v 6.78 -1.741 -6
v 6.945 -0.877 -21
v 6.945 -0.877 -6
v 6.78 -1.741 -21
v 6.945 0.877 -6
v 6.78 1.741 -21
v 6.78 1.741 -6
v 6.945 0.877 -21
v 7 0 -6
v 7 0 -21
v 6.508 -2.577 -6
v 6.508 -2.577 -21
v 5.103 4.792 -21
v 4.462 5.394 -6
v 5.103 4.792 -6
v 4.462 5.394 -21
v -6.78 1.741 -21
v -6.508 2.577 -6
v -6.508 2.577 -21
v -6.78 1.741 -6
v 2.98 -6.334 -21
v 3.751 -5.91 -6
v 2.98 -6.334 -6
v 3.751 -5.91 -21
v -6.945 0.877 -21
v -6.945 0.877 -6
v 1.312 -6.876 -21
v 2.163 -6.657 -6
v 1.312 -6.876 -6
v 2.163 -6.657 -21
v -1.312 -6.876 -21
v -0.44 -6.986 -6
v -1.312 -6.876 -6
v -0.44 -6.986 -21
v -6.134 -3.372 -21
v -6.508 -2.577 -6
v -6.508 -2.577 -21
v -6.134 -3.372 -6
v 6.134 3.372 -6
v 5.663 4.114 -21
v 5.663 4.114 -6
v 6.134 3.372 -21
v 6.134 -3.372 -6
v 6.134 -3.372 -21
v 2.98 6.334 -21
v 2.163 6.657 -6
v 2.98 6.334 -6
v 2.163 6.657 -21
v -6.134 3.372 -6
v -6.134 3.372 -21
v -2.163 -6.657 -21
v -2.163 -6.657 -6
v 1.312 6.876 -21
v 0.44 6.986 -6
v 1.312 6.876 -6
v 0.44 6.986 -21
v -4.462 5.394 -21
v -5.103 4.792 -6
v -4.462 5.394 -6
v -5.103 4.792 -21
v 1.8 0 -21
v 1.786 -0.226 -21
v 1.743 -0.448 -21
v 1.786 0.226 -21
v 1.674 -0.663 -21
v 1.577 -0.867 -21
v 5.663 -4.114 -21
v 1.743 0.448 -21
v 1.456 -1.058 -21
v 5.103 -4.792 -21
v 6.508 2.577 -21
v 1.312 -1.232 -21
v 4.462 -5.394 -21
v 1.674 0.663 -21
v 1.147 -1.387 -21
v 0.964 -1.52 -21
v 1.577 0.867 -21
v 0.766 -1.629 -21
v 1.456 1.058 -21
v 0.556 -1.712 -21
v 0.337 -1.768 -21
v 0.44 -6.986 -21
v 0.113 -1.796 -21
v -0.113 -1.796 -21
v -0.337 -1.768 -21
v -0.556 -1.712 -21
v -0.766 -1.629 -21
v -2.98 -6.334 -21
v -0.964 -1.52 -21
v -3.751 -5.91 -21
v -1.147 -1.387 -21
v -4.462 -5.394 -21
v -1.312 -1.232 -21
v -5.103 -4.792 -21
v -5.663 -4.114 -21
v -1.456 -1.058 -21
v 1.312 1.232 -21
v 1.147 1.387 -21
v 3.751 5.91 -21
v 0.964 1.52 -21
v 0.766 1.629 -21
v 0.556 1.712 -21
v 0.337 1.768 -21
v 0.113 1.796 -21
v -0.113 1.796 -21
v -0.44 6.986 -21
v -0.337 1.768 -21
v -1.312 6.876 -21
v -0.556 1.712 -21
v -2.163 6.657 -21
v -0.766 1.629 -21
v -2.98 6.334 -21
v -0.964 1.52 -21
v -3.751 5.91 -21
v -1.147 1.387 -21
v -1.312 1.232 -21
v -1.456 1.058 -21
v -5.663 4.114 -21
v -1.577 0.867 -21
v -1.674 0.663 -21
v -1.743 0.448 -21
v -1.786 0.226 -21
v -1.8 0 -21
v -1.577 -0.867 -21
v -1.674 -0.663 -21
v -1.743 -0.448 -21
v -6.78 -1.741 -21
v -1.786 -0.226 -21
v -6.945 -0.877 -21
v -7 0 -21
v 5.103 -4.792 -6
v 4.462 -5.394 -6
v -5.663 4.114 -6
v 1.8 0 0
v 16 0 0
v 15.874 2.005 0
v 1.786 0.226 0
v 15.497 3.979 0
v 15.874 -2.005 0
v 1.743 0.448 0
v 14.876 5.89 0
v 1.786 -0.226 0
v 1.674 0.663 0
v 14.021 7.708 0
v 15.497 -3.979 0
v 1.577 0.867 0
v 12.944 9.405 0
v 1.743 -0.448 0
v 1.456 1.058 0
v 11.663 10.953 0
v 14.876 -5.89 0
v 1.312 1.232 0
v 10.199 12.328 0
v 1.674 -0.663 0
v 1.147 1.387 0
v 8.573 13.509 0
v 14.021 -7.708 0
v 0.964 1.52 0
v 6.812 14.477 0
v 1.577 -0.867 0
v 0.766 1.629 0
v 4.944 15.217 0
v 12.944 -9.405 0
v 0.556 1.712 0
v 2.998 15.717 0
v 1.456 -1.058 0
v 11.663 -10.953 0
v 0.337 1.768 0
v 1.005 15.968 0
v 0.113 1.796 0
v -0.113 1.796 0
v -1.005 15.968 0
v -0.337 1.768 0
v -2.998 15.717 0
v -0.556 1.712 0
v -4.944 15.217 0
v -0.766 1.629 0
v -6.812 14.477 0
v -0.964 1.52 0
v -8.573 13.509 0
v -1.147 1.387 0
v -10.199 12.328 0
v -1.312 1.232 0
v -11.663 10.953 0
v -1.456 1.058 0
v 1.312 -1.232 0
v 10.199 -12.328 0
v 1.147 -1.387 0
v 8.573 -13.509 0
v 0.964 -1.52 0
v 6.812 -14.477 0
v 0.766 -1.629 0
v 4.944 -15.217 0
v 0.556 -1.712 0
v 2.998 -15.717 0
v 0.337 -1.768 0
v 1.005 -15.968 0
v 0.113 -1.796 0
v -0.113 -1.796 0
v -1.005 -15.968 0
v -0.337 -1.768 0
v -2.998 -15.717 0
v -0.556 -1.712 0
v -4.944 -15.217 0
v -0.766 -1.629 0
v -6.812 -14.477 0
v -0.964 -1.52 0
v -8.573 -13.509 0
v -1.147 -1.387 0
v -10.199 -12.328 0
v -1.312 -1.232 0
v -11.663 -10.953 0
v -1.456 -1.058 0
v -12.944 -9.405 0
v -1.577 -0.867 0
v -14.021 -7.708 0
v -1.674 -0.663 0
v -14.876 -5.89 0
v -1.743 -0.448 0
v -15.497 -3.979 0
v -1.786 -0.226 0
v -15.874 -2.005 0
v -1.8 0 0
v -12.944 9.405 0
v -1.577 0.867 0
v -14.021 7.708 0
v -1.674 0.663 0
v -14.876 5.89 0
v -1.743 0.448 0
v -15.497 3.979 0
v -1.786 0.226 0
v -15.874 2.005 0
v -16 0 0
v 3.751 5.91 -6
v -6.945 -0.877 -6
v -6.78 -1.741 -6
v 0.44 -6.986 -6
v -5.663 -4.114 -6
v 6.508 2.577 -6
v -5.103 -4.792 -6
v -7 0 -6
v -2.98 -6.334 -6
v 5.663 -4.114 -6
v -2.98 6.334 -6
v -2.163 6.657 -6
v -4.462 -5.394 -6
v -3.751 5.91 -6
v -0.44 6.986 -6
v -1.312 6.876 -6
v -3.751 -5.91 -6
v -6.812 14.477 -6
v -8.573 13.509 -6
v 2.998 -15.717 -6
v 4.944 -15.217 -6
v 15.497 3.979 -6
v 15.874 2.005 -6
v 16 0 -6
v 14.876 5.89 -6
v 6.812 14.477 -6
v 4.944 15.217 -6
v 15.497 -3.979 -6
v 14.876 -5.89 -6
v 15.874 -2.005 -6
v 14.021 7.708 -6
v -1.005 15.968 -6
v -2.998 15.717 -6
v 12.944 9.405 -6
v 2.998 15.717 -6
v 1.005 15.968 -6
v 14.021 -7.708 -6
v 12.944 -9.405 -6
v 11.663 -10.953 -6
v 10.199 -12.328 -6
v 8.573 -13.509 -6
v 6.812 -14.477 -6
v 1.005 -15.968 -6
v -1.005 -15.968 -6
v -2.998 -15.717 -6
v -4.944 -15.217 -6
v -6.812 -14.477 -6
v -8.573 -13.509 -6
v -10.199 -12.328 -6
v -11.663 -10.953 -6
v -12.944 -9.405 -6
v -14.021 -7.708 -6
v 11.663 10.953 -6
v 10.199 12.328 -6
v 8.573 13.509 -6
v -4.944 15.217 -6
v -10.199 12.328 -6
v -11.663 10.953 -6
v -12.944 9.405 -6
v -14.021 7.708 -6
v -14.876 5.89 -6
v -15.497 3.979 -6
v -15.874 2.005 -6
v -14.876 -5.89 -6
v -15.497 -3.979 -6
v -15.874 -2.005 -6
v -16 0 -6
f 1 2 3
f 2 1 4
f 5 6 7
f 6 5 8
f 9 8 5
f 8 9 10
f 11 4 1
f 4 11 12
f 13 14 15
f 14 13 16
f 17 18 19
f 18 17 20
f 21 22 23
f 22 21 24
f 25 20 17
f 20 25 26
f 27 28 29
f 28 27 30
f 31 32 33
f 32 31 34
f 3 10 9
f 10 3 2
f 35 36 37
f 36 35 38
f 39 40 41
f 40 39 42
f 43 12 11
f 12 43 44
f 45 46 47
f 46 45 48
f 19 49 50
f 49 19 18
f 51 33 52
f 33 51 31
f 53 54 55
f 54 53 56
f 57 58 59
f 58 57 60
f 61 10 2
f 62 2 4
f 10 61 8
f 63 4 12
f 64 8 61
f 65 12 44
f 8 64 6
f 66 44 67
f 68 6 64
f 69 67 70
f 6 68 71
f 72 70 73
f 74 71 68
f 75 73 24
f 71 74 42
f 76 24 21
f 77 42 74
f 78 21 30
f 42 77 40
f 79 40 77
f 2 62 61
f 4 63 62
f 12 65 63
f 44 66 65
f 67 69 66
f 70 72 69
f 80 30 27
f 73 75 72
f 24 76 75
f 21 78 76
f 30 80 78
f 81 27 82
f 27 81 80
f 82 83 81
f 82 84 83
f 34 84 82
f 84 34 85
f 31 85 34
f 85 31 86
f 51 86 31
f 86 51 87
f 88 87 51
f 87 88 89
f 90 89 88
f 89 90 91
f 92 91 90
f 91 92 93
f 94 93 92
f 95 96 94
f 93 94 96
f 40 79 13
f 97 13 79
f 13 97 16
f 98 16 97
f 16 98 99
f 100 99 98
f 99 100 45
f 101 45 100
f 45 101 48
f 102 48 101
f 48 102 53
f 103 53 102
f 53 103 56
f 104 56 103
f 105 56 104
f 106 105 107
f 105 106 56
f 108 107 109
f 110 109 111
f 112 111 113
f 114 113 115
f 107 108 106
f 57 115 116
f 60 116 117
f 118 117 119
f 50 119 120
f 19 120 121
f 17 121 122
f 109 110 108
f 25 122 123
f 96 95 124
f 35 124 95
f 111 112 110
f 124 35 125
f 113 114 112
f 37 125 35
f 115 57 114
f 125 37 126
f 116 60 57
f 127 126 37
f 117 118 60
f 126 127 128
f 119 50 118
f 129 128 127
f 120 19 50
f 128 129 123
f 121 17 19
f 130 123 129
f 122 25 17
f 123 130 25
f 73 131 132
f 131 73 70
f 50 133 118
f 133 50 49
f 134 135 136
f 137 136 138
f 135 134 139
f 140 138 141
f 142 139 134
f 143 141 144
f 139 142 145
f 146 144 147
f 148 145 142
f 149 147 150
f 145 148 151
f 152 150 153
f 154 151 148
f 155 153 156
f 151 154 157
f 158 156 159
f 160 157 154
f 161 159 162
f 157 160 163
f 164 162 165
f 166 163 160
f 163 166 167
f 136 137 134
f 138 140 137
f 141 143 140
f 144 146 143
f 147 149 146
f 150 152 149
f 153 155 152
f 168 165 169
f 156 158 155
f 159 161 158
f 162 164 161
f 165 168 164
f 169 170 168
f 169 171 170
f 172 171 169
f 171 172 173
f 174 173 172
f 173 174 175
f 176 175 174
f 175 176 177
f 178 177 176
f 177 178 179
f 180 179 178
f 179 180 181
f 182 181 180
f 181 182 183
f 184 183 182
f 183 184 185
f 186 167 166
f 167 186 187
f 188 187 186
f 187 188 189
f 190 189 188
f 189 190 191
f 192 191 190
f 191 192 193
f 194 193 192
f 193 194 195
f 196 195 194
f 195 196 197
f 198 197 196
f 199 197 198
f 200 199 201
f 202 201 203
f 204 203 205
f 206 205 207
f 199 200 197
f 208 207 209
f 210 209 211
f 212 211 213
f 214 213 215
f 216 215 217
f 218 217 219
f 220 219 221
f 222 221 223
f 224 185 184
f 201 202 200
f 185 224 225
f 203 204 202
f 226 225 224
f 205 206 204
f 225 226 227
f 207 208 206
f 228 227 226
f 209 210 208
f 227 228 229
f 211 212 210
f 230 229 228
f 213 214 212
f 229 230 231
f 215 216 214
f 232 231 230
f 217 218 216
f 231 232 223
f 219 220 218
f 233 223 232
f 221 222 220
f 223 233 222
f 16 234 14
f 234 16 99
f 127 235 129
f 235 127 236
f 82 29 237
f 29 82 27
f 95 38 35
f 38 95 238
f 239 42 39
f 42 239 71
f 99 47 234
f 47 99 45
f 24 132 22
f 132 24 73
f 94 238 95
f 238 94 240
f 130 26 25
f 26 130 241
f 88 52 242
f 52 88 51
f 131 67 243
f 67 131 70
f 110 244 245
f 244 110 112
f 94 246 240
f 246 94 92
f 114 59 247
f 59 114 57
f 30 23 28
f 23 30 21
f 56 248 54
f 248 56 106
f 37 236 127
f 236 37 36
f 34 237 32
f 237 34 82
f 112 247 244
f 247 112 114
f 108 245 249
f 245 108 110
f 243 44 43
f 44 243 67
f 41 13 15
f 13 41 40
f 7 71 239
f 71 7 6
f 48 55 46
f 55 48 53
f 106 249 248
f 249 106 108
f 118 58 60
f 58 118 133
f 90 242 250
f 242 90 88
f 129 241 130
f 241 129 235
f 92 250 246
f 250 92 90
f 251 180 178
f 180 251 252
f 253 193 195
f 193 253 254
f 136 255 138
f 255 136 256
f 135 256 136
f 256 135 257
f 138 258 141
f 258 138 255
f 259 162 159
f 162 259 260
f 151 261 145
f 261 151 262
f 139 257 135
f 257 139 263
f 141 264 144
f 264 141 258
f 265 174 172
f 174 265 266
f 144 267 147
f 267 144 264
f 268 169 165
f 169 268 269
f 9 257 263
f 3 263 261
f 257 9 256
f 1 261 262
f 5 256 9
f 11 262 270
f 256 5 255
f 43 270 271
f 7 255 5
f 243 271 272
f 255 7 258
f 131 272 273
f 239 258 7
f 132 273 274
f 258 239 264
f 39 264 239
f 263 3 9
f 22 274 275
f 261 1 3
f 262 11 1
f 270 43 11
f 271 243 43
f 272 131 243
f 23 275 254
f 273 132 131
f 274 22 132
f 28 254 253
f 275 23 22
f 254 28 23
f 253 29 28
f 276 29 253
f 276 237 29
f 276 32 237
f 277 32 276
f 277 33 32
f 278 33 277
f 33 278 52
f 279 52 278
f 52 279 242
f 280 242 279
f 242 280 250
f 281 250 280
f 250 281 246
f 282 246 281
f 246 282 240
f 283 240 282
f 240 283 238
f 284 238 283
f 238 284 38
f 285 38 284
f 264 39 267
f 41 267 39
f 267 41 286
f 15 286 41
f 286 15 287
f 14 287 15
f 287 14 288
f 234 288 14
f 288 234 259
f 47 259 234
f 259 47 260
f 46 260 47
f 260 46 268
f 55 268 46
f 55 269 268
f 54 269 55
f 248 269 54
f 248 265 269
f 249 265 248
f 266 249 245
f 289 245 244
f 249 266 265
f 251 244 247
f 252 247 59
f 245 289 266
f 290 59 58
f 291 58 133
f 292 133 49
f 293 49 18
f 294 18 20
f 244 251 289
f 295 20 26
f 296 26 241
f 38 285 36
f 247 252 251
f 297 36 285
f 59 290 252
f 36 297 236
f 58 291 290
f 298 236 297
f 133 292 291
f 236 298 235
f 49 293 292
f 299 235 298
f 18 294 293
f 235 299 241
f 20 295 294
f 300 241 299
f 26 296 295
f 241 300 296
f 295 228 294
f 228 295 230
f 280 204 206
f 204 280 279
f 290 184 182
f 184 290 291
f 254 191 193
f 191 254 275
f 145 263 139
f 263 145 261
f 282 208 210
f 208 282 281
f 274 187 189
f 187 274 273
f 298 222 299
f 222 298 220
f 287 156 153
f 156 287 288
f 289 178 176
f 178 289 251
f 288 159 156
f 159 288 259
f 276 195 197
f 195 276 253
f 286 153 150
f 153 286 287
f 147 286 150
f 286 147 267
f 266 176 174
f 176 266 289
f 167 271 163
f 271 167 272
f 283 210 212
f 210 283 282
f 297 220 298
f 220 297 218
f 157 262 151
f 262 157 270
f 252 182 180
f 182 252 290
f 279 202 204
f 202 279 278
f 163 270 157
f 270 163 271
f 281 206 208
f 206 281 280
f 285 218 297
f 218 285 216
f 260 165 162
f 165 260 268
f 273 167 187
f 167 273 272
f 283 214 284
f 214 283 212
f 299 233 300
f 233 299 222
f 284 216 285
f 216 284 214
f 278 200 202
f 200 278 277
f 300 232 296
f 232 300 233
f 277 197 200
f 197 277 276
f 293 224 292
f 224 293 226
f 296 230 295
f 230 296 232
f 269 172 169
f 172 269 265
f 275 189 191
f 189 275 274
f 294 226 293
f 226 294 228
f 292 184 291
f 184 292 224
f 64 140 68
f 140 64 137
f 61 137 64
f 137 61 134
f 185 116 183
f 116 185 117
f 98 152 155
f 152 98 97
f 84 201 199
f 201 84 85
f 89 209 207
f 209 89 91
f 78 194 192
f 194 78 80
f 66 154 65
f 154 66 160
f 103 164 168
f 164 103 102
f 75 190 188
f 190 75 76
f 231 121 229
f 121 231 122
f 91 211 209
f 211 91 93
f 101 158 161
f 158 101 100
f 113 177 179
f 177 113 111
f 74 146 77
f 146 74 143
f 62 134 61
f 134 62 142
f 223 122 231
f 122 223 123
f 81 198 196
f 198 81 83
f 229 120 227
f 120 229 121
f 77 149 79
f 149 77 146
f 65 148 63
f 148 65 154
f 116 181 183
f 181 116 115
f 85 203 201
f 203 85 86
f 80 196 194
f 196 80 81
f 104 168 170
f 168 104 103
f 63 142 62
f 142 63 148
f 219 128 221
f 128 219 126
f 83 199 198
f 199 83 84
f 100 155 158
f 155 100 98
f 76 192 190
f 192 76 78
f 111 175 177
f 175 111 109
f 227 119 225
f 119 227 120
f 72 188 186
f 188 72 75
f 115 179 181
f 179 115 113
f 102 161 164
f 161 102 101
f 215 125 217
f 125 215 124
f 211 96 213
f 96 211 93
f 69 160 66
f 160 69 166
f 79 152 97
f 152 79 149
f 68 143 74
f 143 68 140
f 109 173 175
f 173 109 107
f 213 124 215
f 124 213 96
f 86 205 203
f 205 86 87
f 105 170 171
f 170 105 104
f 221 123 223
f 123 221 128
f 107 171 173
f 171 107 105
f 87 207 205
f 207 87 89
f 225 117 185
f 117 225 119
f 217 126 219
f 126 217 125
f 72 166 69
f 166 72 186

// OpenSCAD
$fn = 50;


difference() {
	union() {
		translate(v = [0, 0, -21.0000000000]) {
			cylinder(h = 21, r = 7.0000000000);
		}
		translate(v = [0, 0, -6.0000000000]) {
			cylinder(h = 6, r = 16.0000000000);
		}
	}
	union() {
		#translate(v = [0, 0, -21]) {
			cylinder(h = 21, r = 1.8000000000);
		}
	}
}
